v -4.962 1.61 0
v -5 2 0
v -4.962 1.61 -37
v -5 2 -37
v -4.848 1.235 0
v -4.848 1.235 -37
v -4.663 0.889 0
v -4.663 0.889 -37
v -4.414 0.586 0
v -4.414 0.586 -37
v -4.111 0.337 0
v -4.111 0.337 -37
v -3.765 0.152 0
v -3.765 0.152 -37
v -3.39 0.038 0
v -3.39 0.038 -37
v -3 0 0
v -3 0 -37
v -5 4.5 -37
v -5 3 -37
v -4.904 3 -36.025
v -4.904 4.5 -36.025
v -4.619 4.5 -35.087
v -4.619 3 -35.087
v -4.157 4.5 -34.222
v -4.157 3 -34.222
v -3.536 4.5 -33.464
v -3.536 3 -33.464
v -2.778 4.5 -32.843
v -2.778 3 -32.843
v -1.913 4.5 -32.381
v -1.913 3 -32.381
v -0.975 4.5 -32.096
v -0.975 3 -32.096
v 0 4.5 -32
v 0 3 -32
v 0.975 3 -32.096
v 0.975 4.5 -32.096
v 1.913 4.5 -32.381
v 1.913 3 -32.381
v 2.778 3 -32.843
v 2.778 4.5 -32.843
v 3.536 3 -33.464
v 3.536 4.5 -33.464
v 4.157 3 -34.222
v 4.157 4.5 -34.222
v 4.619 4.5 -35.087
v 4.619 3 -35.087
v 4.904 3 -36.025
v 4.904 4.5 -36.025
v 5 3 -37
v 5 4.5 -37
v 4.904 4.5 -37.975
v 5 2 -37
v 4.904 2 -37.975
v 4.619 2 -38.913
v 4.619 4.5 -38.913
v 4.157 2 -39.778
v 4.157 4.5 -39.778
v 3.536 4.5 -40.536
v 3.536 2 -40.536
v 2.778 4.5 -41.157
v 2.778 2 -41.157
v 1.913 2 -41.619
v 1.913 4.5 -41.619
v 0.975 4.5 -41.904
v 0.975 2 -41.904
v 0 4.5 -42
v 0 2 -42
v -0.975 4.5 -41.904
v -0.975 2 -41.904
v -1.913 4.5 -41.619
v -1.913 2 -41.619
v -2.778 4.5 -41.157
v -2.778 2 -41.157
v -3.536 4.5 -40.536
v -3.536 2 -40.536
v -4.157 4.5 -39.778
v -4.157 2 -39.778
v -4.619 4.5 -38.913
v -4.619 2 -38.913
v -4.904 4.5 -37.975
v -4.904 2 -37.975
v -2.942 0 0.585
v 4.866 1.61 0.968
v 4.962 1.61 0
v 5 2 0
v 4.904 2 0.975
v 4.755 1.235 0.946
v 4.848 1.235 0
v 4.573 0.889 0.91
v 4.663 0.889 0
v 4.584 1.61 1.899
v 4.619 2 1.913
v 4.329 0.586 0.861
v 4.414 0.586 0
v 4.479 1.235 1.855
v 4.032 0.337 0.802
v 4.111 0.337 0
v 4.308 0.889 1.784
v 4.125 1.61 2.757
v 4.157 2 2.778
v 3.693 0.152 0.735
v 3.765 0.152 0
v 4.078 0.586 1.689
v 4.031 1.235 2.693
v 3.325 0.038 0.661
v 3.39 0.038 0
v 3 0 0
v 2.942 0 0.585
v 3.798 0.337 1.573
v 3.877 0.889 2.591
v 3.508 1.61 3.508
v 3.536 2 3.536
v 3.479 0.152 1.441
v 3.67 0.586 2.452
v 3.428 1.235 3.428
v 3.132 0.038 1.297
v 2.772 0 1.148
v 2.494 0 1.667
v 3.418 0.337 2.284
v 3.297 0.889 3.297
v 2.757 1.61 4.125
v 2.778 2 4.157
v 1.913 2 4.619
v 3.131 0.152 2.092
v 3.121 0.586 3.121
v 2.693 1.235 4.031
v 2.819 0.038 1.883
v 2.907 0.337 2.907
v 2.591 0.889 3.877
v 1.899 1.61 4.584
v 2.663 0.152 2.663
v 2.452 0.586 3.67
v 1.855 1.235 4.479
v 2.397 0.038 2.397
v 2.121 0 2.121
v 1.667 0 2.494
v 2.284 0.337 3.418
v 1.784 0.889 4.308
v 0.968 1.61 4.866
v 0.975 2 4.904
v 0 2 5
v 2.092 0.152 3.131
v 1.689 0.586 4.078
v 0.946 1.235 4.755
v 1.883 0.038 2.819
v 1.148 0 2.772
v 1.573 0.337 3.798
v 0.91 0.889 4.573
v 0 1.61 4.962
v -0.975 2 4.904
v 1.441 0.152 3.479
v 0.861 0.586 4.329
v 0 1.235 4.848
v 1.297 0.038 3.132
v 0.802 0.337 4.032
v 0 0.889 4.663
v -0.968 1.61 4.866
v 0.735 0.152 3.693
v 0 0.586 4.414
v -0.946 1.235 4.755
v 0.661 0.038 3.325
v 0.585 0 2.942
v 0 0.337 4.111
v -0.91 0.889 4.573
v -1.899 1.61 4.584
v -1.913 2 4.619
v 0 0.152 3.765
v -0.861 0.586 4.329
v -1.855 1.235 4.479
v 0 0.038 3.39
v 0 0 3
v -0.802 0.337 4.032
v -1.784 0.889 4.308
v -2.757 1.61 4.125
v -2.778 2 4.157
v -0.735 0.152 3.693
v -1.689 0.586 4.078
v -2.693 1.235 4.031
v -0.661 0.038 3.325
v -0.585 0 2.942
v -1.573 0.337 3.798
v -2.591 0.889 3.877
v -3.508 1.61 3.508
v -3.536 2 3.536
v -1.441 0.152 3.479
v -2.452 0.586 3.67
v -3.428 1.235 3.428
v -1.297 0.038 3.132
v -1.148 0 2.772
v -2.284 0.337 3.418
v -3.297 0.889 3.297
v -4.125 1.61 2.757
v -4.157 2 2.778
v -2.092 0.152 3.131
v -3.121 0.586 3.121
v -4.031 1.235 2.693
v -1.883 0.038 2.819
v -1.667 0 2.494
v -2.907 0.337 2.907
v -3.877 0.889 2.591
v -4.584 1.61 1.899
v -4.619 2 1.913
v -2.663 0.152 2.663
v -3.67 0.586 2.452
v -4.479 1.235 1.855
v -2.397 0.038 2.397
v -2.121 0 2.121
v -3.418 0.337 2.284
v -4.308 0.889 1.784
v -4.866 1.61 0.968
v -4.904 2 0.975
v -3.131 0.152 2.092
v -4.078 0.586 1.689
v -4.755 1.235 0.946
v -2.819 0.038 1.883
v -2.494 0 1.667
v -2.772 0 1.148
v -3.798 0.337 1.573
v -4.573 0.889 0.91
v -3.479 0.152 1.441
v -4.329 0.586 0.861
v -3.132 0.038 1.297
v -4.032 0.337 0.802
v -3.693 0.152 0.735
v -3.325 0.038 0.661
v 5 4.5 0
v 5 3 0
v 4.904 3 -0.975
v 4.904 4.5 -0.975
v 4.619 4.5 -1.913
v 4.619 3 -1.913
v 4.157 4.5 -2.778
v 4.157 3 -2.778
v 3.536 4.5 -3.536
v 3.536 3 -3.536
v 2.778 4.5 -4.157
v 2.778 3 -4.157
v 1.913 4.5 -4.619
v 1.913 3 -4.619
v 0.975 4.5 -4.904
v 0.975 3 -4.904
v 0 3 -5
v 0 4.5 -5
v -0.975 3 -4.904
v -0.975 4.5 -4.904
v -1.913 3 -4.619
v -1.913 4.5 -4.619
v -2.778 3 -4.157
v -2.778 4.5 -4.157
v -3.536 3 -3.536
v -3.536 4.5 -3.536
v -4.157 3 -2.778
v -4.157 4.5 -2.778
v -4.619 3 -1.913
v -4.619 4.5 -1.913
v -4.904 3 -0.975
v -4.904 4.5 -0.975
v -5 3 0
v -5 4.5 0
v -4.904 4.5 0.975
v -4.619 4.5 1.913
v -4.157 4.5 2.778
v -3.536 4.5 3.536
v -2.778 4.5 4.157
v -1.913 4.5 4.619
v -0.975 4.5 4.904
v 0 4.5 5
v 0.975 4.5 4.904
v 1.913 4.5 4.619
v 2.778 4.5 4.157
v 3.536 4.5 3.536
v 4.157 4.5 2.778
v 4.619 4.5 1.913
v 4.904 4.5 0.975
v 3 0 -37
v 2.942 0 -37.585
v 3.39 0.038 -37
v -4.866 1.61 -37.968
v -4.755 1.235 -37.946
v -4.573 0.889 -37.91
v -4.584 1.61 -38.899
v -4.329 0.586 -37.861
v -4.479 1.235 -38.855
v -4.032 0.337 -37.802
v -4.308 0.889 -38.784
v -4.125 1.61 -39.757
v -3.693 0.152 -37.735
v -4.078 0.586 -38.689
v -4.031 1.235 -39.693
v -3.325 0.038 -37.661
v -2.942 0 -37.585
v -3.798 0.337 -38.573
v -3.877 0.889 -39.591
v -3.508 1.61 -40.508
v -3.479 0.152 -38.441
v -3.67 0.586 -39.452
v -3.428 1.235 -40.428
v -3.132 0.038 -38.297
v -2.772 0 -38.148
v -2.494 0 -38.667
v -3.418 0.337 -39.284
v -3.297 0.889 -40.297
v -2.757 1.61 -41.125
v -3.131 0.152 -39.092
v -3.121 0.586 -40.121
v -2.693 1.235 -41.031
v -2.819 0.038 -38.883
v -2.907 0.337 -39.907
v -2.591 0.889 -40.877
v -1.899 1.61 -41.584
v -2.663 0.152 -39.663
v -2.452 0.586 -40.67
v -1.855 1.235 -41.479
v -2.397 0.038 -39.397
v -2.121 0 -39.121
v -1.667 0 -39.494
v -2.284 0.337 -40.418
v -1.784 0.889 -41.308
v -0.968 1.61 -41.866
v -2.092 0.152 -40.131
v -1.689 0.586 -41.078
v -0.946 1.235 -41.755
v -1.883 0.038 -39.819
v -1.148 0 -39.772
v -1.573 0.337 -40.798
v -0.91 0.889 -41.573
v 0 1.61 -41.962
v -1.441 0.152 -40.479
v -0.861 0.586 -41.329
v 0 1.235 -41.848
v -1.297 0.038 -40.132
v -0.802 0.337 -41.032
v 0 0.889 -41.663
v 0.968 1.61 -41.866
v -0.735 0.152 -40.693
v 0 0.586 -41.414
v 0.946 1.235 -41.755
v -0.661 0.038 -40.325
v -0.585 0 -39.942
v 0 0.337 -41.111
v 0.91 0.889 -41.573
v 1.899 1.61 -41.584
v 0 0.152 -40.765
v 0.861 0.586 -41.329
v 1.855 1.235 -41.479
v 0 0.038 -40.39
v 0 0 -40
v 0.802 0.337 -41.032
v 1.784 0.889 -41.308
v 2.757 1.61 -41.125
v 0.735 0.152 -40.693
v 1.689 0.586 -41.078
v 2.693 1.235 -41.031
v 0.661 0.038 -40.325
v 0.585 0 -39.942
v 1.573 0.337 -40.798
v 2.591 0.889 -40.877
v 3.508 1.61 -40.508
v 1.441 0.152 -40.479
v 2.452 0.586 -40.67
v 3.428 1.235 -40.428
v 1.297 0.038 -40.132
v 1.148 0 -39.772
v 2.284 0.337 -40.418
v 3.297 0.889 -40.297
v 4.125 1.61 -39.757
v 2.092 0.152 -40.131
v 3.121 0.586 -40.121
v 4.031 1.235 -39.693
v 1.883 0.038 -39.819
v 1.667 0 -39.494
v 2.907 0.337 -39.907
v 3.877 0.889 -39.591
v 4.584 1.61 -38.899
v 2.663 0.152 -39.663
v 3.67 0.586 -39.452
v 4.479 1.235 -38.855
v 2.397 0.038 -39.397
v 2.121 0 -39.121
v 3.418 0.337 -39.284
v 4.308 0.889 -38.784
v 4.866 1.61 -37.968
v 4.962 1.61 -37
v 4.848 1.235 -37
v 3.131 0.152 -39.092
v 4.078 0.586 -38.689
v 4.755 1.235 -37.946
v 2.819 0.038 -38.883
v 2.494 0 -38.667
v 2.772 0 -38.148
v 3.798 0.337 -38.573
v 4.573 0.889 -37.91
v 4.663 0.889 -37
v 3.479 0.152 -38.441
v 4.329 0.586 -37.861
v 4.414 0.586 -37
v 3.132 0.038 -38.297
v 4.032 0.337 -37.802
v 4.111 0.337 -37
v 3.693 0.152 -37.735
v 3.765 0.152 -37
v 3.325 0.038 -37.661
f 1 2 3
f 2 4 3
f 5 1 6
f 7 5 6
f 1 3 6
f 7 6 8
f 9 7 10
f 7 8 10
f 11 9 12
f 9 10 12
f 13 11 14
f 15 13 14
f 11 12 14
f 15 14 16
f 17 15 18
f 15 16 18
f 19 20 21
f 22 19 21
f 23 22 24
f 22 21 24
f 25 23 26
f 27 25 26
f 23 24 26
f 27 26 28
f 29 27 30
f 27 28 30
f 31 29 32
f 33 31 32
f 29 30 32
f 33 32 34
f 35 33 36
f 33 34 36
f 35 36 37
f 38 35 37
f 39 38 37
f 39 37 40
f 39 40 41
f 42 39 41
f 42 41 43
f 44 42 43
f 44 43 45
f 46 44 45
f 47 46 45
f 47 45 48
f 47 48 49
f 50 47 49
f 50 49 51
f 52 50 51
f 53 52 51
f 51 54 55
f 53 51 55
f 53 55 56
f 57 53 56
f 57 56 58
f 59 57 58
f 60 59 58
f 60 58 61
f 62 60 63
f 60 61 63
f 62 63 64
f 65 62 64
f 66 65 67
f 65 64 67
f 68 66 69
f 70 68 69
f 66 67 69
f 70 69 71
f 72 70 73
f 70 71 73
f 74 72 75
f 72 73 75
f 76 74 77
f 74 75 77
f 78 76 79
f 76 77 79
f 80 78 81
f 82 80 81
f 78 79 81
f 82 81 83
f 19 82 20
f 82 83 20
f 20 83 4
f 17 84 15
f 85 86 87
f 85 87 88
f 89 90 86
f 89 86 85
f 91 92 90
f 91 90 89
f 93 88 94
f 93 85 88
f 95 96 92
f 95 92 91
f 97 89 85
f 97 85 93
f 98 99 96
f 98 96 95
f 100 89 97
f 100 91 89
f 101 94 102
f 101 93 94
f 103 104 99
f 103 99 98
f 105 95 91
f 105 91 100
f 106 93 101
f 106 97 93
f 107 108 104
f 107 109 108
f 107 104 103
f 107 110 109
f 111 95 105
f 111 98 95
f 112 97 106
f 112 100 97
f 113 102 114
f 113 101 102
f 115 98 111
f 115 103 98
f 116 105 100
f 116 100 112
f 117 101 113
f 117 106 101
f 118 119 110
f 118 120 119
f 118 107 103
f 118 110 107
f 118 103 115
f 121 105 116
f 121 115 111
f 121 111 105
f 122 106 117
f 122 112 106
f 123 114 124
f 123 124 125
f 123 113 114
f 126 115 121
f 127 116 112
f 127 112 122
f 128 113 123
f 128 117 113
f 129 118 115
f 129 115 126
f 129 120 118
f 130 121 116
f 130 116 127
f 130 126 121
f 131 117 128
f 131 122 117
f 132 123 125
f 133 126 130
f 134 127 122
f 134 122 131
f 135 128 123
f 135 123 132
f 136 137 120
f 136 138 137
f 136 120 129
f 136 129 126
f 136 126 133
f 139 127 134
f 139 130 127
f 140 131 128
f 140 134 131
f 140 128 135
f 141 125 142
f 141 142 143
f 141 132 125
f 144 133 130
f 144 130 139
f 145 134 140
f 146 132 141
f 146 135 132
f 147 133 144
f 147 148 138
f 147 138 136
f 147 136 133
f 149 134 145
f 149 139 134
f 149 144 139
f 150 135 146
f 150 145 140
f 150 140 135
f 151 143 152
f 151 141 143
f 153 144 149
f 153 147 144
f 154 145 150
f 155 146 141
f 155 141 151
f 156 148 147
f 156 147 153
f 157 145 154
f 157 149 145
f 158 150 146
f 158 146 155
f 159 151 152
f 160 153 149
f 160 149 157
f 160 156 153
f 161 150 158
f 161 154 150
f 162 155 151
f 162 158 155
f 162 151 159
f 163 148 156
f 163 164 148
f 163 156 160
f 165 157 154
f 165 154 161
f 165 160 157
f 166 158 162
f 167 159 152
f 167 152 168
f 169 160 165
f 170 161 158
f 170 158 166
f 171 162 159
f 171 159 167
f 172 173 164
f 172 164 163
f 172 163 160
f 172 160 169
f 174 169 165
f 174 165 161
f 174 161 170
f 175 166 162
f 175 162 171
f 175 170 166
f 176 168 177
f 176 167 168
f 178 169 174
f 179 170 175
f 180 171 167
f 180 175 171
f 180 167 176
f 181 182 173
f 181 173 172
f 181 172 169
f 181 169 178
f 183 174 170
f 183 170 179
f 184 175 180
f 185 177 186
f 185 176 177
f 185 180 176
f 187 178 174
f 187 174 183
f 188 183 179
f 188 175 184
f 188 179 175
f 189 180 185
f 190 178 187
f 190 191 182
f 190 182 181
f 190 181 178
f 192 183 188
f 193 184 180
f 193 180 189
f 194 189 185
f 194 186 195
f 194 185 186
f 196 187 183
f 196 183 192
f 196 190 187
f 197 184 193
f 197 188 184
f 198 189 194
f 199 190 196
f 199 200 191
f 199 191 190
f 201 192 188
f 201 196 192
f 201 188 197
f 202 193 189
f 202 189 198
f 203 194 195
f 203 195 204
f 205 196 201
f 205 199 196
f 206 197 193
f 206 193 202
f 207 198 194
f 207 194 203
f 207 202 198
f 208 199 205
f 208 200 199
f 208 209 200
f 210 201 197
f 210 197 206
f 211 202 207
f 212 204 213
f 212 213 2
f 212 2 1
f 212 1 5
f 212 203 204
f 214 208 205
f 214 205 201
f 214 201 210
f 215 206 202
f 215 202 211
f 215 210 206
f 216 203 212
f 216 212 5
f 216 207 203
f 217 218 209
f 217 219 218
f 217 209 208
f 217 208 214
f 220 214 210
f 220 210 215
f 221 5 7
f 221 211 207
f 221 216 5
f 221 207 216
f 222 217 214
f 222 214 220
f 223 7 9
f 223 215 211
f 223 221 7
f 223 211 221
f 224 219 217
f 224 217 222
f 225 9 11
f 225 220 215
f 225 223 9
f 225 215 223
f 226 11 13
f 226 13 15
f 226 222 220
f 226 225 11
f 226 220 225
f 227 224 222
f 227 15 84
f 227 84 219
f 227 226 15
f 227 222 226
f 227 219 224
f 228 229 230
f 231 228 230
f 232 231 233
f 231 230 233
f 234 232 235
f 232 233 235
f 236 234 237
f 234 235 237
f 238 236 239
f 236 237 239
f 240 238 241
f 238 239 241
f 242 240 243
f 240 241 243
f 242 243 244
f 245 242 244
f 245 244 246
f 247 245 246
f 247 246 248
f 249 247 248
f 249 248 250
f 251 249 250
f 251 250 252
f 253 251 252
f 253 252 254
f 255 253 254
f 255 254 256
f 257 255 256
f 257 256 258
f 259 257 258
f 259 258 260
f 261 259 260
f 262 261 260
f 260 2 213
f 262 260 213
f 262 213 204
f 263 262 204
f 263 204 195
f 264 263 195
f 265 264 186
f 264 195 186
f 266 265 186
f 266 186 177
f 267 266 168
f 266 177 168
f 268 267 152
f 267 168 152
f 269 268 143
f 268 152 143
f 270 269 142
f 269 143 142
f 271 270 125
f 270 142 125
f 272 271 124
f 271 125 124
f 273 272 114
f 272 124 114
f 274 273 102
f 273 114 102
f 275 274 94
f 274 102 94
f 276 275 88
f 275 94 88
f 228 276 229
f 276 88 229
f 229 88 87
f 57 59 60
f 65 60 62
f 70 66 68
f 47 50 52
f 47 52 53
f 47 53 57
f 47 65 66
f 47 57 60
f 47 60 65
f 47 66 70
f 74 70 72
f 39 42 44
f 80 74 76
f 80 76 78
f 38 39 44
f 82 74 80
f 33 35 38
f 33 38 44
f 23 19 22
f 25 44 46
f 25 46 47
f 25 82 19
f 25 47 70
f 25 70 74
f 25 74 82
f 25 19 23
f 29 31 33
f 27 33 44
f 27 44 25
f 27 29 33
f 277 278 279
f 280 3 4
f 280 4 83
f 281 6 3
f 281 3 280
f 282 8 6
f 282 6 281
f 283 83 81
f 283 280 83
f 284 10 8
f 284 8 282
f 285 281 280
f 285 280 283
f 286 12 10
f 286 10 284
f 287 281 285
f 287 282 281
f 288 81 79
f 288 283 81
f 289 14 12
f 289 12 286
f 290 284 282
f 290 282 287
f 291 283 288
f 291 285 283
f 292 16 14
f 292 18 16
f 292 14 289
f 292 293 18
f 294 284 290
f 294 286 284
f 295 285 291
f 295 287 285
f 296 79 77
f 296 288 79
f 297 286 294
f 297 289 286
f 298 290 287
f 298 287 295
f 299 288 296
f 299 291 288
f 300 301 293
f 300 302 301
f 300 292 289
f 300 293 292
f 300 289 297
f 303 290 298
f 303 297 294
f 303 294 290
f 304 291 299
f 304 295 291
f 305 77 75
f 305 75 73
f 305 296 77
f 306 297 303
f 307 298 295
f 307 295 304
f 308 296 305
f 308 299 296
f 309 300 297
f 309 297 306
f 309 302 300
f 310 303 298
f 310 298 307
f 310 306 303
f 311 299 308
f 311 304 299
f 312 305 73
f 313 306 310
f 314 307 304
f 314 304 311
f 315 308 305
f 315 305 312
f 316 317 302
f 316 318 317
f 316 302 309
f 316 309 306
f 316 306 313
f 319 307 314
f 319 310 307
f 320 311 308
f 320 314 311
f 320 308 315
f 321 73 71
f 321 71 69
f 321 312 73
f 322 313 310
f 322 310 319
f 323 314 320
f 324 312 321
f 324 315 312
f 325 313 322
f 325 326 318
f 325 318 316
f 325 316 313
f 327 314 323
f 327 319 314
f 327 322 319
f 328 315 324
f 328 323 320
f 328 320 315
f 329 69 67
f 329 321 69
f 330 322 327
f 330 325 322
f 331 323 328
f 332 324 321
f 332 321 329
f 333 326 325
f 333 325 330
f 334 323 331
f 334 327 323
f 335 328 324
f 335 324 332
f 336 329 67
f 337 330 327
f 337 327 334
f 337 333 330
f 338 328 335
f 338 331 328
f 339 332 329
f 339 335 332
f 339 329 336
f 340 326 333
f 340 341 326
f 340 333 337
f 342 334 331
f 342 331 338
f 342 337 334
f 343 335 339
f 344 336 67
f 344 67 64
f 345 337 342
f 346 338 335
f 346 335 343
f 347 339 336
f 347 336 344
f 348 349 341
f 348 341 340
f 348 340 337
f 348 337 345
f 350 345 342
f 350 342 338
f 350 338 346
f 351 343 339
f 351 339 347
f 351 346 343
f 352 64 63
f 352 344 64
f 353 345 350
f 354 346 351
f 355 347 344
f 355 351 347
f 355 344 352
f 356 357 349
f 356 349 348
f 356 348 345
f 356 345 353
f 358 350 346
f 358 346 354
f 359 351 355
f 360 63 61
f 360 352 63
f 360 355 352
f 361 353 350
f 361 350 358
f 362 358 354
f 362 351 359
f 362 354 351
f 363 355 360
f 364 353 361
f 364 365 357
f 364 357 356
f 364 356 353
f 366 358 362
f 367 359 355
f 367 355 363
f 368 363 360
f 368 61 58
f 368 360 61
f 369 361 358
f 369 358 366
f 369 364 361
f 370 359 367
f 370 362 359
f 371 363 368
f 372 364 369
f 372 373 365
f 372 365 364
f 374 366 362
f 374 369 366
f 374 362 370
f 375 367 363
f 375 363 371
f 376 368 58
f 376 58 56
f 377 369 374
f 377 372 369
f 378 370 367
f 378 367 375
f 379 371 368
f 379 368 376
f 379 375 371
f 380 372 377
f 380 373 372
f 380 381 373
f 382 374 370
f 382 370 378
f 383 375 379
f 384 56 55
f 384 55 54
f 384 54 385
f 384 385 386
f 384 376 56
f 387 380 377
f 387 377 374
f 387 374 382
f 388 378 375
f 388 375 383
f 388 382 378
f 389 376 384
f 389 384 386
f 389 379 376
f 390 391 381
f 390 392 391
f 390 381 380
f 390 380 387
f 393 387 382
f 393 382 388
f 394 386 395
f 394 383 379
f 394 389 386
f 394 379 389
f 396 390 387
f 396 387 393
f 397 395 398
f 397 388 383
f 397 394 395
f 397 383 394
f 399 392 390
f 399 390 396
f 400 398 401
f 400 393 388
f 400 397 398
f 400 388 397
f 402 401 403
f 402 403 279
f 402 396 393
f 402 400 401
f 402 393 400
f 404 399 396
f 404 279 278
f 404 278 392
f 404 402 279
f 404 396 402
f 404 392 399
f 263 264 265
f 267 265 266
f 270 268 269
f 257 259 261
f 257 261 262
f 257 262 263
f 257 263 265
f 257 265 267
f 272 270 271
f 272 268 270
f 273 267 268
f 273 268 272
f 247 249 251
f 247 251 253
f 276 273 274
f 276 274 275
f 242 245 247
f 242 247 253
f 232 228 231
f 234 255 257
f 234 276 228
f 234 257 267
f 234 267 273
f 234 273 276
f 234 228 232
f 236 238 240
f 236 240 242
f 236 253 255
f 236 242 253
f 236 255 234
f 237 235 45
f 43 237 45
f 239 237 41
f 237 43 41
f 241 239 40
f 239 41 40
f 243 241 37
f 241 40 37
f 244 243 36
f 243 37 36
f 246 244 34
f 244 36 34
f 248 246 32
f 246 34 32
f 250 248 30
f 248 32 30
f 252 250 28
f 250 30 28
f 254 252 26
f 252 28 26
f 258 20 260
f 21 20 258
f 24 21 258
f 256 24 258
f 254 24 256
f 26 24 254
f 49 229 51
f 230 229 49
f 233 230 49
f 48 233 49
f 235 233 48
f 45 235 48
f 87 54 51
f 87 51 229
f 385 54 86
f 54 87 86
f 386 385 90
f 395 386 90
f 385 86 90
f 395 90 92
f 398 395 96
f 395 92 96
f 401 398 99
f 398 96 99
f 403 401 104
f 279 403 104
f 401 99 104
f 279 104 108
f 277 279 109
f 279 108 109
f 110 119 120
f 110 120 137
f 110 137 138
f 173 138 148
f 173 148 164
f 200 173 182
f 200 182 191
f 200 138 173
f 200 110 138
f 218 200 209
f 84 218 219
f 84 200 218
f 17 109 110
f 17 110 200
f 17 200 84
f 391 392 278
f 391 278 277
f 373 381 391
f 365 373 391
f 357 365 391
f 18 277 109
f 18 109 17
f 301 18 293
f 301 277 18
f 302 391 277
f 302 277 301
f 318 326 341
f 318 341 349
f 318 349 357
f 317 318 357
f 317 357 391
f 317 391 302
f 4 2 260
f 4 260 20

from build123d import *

# Parameters (mm, degrees)
BOSS_EXTRUDE1_DEPTH = 3
SKETCH2_R           = 5
BOSS_EXTRUDE2_DEPTH = 1.5
FILLET1_R           = 2


with BuildPart() as part:
    # Sketch1 → Boss-Extrude1 (new body)
    with BuildSketch(Plane(origin=(0, 0, 0), x_dir=(1, 0, 0), z_dir=(0, 1, 0))):
        with BuildLine():
            Line((-5, 0), (-5, 37))
            ThreePointArc((-5, 37), (0, 42), (5, 37))
            Line((5, 37), (5, 0))
            ThreePointArc((5, 0), (0, -5), (-5, 0))
        make_face()
    extrude(amount=BOSS_EXTRUDE1_DEPTH)

    # Sketch2 → Boss-Extrude2 (add)
    with BuildSketch(Plane(origin=(0, 3, 0), x_dir=(1, 0, 0), z_dir=(0, 1, 0))):
        with BuildLine():
            ThreePointArc((-5, 0), (0, -5), (5, 0))
            ThreePointArc((5, 0), (0, 5), (-5, 0))
        make_face()
        with Locations(Location((0, 37, 0), (0, 0, 180))):
            Circle(SKETCH2_R)
    extrude(amount=BOSS_EXTRUDE2_DEPTH)

    # Fillet1
    fillet1_edges = [part.edges().sort_by_distance(p)[0] for p in [
        (-5, 0, -18.5),
        (0, 0, -42),
        (5, 0, -18.5),
        (0, 0, 5),
    ]]
    fillet(fillet1_edges, radius=FILLET1_R)


solid = part.part
